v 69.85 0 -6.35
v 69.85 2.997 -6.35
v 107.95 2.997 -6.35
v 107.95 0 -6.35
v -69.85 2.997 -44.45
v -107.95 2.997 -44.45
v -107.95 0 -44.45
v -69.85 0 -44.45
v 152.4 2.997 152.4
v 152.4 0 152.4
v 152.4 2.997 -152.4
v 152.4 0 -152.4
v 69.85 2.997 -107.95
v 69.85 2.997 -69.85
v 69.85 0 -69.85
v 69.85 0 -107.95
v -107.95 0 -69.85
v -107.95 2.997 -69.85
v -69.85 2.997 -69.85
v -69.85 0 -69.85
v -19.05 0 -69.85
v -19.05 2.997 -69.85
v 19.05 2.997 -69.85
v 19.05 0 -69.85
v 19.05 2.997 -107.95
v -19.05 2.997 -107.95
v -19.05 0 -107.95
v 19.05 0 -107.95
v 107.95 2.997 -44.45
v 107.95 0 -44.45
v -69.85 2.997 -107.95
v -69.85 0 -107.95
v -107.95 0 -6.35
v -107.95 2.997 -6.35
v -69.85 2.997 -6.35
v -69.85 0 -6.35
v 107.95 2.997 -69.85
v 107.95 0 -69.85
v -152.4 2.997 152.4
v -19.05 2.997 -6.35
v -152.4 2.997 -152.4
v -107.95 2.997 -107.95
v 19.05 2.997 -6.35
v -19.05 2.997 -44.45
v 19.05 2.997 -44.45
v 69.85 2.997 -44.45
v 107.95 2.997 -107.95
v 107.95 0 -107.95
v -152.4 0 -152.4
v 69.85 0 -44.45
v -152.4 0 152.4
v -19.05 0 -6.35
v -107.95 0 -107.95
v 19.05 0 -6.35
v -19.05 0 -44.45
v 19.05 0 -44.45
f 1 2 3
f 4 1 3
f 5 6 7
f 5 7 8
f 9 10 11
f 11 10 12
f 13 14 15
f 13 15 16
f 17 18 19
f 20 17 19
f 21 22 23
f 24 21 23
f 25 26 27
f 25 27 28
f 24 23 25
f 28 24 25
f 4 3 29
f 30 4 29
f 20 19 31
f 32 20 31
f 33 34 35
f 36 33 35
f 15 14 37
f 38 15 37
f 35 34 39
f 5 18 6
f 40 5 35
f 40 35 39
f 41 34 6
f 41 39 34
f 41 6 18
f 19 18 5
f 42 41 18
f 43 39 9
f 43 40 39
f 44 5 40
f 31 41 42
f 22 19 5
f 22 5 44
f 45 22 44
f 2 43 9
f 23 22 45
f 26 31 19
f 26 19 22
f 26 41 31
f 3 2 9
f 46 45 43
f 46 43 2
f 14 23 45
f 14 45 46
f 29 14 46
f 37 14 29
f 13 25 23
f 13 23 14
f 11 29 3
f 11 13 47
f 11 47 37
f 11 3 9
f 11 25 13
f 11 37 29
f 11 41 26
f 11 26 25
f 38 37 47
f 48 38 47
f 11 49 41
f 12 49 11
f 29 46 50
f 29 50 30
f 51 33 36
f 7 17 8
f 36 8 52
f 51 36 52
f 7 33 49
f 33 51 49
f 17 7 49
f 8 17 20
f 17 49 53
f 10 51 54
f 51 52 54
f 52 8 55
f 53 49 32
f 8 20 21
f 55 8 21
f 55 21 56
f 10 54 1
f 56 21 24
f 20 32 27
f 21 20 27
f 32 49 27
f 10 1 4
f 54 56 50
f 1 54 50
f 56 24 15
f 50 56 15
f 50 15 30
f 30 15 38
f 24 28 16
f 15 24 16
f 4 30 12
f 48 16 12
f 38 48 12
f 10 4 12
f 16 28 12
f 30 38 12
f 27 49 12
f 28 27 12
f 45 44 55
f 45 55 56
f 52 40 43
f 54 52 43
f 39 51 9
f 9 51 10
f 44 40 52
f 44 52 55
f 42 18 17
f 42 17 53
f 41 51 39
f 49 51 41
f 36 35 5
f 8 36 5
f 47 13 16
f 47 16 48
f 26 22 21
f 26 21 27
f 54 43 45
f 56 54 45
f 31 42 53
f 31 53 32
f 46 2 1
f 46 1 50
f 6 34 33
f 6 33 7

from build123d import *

# Parameters (mm, degrees)
SKETCH1_W            = 304.8
SKETCH1_H            = 304.8
BOSS_EXTRUDE1_DEPTH  = 2.9972
SKETCH2_W            = 38.1
SKETCH2_H            = 38.1
CUT_EXTRUDE1_DEPTH   = 2.9972
LPATTERN1_COUNT      = 3
LPATTERN1_PITCH      = 88.9
LPATTERN1_COUNT_DIR2 = 2
LPATTERN1_PITCH_DIR2 = 63.5


with BuildPart() as part:
    # Sketch1 → Boss-Extrude1 (new body)
    with BuildSketch(Plane(origin=(0, 0, 0), x_dir=(1, 0, 0), z_dir=(0, 1, 0))):
        Rectangle(SKETCH1_W, SKETCH1_H)
    extrude(amount=BOSS_EXTRUDE1_DEPTH)

    # Sketch2 → Cut-Extrude1 (cut)
    with BuildSketch(Plane(origin=(0, 2.9972, 0), x_dir=(1, 0, 0), z_dir=(0, 1, 0))):
        with Locations((-88.9, 88.9)):
            Rectangle(SKETCH2_W, SKETCH2_H)
    cut_extrude1 = extrude(amount=-CUT_EXTRUDE1_DEPTH, mode=Mode.SUBTRACT)

    # LPattern1: Cut-Extrude1 3 × 2
    with Locations(*[(i * LPATTERN1_PITCH, 0, j * LPATTERN1_PITCH_DIR2) for i in range(LPATTERN1_COUNT) for j in range(LPATTERN1_COUNT_DIR2) if (i, j) != (0, 0)]):
        add(cut_extrude1, mode=Mode.SUBTRACT)


solid = part.part
